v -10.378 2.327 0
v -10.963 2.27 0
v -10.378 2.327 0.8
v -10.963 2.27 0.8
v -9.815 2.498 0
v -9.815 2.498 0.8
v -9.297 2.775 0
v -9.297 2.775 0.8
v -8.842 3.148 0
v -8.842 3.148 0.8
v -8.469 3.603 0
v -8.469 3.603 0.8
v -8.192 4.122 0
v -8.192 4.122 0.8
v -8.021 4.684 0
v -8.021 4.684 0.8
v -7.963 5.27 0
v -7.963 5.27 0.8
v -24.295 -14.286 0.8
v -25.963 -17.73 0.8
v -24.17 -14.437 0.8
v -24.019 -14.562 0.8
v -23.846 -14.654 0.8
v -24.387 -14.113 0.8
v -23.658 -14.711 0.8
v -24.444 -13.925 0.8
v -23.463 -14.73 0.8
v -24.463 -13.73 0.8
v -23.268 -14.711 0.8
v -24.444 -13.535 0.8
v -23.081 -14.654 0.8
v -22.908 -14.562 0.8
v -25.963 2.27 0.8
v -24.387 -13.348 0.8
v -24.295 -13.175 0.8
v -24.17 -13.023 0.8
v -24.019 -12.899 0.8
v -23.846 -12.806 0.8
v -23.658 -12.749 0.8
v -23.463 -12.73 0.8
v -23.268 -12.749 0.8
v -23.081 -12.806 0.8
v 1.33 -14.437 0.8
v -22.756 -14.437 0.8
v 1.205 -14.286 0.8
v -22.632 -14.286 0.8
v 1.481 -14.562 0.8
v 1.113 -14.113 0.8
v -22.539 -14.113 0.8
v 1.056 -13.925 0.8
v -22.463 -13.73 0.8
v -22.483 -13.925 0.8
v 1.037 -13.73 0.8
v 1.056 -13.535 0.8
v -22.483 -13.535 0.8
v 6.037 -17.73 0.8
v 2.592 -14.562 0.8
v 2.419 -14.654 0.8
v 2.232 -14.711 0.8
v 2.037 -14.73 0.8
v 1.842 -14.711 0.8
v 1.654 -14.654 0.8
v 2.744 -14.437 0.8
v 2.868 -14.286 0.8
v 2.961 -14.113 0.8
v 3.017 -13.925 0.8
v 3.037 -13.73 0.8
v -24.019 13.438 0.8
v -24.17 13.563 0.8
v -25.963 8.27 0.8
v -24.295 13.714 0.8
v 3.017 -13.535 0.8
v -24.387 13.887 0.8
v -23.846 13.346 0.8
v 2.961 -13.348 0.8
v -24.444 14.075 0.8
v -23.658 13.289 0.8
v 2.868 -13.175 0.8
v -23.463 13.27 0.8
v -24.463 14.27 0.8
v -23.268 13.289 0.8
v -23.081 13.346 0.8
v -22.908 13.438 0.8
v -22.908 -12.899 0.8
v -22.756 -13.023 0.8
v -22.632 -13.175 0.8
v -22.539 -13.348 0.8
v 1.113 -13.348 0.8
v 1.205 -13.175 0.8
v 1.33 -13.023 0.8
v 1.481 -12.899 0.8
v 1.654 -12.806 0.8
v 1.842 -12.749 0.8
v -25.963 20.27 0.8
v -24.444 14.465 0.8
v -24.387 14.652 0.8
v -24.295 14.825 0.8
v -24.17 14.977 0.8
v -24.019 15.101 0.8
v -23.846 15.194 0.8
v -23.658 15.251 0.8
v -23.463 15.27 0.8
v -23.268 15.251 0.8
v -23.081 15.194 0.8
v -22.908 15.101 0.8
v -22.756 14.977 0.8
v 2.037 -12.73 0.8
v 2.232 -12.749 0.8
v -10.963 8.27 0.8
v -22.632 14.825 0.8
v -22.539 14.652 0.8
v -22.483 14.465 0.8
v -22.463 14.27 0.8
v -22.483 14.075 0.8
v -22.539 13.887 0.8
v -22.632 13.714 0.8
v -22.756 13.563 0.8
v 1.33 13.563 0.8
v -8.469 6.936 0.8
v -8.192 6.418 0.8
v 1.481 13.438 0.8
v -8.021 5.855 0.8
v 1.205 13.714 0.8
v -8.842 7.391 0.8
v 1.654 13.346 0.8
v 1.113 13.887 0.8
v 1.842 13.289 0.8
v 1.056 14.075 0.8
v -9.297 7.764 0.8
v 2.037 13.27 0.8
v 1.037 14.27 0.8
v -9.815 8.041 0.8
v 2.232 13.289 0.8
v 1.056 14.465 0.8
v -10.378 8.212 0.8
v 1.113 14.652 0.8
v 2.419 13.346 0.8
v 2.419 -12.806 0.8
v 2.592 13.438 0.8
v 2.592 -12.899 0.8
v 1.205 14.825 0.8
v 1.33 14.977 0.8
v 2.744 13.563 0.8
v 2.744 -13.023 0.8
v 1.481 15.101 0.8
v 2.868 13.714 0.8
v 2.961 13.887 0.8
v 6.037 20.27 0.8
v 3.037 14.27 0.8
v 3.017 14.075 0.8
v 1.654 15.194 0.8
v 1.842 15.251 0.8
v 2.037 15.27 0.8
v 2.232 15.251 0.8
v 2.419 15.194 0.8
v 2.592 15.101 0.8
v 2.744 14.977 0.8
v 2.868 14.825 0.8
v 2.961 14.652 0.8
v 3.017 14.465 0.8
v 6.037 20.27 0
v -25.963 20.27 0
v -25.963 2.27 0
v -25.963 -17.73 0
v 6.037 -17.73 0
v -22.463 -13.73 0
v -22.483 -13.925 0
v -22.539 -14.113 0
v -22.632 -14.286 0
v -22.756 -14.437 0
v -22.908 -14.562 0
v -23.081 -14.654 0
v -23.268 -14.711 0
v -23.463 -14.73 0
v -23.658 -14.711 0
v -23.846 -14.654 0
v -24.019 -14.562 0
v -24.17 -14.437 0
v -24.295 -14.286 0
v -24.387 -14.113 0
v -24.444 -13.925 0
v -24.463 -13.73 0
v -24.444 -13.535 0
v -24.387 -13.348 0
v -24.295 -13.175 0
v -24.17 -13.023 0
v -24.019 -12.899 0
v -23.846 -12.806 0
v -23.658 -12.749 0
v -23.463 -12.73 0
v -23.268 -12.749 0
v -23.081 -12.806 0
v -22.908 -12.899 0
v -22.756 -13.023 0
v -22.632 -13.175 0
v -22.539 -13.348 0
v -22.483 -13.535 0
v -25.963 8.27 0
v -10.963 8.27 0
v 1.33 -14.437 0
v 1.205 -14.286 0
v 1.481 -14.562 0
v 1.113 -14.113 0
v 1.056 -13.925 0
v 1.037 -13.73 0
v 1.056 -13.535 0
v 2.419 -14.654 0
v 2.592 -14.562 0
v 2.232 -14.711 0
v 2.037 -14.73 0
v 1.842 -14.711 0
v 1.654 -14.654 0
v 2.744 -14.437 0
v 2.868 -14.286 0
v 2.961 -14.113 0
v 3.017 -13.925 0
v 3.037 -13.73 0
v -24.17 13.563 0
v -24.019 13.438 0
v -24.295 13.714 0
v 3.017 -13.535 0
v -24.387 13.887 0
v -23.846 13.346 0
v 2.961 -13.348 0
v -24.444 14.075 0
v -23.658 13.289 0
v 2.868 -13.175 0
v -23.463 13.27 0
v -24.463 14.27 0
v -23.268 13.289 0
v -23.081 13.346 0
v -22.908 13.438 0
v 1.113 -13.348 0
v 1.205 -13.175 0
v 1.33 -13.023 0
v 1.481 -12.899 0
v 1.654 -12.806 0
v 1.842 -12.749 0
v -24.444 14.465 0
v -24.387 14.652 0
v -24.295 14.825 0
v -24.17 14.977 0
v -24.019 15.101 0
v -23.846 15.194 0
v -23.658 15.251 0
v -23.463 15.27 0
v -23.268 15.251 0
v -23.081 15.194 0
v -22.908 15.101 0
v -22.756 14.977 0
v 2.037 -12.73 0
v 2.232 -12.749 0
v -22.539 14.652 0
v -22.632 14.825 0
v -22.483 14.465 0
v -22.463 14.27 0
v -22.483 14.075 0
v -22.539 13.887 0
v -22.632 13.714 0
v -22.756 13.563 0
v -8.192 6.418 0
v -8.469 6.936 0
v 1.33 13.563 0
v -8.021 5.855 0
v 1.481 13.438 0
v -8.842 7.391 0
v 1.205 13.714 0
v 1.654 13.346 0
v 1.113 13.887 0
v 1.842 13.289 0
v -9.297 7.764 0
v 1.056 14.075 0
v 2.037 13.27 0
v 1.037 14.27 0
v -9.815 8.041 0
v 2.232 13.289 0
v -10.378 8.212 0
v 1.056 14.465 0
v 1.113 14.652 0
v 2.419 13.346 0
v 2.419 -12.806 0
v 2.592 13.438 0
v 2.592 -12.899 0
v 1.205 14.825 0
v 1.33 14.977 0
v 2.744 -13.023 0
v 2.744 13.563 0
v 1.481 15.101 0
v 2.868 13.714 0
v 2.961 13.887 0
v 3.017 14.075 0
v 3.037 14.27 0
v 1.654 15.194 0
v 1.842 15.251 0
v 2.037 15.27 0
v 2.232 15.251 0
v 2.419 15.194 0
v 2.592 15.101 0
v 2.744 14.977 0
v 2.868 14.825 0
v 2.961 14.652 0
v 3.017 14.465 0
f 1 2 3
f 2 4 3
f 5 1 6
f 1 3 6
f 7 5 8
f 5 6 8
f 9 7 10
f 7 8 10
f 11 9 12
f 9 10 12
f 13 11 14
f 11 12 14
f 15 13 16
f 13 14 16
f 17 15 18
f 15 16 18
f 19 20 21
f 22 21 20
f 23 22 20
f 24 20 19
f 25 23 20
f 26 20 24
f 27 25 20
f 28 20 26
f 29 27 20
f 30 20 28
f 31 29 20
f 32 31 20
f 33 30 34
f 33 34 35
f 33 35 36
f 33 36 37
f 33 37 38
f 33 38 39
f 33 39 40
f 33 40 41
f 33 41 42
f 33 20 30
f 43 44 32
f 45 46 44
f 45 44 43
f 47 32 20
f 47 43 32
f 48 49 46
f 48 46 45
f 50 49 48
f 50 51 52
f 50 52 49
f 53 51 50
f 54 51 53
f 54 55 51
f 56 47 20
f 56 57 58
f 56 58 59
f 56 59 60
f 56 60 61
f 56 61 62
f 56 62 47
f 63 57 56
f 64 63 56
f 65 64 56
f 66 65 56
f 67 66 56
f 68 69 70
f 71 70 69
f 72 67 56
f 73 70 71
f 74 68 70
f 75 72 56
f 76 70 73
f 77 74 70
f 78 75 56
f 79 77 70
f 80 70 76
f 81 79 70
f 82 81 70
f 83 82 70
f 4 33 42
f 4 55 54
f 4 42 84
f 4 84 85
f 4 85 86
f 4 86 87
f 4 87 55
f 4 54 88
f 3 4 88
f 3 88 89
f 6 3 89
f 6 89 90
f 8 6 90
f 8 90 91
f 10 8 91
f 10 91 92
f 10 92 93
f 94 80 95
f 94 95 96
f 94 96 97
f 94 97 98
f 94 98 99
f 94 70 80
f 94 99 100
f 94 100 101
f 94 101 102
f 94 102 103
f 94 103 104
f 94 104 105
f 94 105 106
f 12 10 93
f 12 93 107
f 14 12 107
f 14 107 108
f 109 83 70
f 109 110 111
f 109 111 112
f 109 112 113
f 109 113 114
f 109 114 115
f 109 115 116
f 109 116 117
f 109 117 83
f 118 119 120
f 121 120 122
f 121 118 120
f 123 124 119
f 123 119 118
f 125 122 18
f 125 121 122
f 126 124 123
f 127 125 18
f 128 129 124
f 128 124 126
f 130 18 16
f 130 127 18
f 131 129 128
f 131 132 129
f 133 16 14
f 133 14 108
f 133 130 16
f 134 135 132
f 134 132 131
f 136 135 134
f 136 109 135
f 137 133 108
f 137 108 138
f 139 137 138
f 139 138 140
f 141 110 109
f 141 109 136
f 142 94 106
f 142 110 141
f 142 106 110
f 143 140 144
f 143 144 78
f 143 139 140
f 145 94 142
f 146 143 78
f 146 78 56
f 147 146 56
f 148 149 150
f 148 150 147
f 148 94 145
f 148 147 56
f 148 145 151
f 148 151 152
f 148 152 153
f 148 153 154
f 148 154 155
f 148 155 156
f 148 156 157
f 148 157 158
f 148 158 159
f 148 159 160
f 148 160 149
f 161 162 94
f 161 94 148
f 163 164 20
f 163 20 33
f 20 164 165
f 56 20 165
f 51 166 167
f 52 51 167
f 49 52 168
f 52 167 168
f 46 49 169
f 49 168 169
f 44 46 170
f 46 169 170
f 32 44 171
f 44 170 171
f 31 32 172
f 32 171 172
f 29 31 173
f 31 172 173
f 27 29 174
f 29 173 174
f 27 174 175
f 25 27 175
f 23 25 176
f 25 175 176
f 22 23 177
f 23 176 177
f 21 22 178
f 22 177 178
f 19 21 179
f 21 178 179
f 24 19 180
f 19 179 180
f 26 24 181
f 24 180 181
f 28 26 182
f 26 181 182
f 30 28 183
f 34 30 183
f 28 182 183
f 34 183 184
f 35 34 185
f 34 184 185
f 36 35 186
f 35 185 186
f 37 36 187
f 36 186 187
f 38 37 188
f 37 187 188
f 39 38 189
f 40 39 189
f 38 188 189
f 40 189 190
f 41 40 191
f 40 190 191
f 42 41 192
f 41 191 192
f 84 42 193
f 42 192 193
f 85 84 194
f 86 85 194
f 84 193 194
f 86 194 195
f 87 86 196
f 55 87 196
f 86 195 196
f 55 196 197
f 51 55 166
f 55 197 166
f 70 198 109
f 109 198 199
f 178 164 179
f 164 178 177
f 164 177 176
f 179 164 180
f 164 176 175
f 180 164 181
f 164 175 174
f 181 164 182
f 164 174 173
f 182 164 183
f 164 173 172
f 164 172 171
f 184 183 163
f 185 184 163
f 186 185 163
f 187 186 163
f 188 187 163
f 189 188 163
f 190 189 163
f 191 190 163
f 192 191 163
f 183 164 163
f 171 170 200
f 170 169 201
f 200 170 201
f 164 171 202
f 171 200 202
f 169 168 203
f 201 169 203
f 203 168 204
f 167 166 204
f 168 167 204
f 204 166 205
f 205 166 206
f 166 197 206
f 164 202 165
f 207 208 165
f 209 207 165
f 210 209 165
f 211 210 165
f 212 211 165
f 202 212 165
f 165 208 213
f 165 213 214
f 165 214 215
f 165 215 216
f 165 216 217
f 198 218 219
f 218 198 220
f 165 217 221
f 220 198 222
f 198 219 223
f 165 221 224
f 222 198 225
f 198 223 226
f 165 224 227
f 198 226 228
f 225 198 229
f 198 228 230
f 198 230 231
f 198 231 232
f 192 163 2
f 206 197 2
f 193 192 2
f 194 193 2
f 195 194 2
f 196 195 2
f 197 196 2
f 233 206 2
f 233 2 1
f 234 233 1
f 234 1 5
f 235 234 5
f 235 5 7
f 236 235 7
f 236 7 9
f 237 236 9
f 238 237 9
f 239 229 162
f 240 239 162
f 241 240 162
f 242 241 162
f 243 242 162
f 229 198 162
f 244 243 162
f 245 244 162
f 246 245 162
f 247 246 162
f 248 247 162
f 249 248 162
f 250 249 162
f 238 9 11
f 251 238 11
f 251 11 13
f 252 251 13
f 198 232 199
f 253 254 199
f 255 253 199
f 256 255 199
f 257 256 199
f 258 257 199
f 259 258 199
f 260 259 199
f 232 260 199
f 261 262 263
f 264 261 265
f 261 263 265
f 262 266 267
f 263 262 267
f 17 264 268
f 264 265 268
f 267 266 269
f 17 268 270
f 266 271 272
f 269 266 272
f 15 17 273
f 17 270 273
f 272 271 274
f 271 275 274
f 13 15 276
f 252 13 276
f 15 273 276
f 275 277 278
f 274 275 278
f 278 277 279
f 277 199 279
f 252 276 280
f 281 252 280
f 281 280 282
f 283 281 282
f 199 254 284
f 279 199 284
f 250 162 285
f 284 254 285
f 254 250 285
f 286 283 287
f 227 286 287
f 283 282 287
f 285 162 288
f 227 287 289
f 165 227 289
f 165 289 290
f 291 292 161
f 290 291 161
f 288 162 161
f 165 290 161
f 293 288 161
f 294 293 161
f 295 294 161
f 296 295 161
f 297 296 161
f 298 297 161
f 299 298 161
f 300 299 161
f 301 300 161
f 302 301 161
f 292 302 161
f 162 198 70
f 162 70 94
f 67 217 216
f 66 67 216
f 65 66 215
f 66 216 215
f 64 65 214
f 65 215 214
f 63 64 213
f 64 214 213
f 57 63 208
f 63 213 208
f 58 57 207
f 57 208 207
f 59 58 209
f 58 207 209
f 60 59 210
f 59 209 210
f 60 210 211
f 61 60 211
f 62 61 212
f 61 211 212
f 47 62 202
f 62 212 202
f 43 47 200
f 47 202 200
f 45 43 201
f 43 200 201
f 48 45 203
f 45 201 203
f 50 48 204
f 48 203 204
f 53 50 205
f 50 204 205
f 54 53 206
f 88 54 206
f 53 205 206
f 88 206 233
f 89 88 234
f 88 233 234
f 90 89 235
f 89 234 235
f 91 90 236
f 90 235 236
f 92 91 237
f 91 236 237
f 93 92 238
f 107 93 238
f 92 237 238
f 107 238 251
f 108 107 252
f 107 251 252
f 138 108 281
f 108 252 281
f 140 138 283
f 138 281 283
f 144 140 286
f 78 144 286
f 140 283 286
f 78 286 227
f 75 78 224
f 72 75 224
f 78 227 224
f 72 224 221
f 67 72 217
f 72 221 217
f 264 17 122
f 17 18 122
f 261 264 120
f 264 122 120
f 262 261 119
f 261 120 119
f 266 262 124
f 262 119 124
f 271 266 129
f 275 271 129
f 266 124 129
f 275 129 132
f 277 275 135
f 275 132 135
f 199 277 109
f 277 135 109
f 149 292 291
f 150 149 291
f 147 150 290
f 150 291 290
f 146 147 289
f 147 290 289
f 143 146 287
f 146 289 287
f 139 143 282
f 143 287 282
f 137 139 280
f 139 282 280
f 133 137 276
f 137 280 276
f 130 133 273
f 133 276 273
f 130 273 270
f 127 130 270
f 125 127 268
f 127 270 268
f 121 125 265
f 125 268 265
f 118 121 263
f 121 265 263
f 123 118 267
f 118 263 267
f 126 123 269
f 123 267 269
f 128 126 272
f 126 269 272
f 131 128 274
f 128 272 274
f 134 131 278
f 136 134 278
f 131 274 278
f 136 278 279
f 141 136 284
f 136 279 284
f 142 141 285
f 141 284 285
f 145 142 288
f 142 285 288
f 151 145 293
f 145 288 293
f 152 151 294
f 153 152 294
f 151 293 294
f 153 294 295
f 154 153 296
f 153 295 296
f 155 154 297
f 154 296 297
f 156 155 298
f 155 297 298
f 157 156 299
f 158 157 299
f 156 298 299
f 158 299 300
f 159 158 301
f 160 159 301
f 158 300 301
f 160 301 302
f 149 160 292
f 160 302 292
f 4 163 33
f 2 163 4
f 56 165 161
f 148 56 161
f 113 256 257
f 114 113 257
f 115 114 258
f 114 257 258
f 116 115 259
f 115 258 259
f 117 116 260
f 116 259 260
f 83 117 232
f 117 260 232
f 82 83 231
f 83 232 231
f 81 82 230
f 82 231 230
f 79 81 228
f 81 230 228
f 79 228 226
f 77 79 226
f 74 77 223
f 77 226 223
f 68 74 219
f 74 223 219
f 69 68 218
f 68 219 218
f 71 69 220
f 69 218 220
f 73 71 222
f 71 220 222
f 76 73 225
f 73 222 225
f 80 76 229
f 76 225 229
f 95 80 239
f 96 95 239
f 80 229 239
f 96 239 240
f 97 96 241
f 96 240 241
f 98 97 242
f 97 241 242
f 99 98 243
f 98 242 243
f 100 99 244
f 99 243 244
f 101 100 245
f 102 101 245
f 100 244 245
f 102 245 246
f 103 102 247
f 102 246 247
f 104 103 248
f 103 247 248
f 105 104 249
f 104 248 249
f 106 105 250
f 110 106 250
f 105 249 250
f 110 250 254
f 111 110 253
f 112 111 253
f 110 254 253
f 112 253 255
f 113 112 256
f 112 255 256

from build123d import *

# Parameters (mm, degrees)
F0_W     = 32
F0_H     = 38
F1_DEPTH = 0.8
F2_R     = 1
F2_W     = 18
F2_H     = 6
F3_DEPTH = 0.8
F4_R     = 2.99999


# Not quite as in the source:
# - a fillet or chamfer is up to 0.001 mm smaller than in the source, because OpenCascade refuses the exact size


with BuildPart() as f1:
    # F0 (on Top) → F1 (new body)
    with BuildSketch(Plane.XY):
        with Locations((-9.963327945, 1.2697370127)):
            Rectangle(F0_W, F0_H)
    extrude(amount=F1_DEPTH)

    # F2 (on face) → F3 (cut, through all)
    with BuildSketch(Plane(origin=(0, 0, 0), x_dir=(1, 0, 0), z_dir=(0, 0, -1))):
        with Locations((-23.463327945, 13.7302629873)):
            Circle(F2_R)
        with Locations((-23.463327945, -14.2697370127)):
            Circle(F2_R)
        with Locations((2.036672055, 13.7302629873)):
            Circle(F2_R)
        with Locations((2.036672055, -14.2697370127)):
            Circle(F2_R)
        with Locations((-16.963327945, -5.2697370127)):
            Rectangle(F2_W, F2_H)
    extrude(amount=-F3_DEPTH, mode=Mode.SUBTRACT)

    # F4 (radius 3 in the source; OpenCascade refuses exactly that, so slightly less here)
    f4_edges = [f1.edges().sort_by_distance(p)[0] for p in [
        (-7.963328, 8.269737, 0.4),
        (-7.963328, 2.269737, 0.4),
    ]]
    fillet(f4_edges, radius=F4_R)


solid = f1.part
